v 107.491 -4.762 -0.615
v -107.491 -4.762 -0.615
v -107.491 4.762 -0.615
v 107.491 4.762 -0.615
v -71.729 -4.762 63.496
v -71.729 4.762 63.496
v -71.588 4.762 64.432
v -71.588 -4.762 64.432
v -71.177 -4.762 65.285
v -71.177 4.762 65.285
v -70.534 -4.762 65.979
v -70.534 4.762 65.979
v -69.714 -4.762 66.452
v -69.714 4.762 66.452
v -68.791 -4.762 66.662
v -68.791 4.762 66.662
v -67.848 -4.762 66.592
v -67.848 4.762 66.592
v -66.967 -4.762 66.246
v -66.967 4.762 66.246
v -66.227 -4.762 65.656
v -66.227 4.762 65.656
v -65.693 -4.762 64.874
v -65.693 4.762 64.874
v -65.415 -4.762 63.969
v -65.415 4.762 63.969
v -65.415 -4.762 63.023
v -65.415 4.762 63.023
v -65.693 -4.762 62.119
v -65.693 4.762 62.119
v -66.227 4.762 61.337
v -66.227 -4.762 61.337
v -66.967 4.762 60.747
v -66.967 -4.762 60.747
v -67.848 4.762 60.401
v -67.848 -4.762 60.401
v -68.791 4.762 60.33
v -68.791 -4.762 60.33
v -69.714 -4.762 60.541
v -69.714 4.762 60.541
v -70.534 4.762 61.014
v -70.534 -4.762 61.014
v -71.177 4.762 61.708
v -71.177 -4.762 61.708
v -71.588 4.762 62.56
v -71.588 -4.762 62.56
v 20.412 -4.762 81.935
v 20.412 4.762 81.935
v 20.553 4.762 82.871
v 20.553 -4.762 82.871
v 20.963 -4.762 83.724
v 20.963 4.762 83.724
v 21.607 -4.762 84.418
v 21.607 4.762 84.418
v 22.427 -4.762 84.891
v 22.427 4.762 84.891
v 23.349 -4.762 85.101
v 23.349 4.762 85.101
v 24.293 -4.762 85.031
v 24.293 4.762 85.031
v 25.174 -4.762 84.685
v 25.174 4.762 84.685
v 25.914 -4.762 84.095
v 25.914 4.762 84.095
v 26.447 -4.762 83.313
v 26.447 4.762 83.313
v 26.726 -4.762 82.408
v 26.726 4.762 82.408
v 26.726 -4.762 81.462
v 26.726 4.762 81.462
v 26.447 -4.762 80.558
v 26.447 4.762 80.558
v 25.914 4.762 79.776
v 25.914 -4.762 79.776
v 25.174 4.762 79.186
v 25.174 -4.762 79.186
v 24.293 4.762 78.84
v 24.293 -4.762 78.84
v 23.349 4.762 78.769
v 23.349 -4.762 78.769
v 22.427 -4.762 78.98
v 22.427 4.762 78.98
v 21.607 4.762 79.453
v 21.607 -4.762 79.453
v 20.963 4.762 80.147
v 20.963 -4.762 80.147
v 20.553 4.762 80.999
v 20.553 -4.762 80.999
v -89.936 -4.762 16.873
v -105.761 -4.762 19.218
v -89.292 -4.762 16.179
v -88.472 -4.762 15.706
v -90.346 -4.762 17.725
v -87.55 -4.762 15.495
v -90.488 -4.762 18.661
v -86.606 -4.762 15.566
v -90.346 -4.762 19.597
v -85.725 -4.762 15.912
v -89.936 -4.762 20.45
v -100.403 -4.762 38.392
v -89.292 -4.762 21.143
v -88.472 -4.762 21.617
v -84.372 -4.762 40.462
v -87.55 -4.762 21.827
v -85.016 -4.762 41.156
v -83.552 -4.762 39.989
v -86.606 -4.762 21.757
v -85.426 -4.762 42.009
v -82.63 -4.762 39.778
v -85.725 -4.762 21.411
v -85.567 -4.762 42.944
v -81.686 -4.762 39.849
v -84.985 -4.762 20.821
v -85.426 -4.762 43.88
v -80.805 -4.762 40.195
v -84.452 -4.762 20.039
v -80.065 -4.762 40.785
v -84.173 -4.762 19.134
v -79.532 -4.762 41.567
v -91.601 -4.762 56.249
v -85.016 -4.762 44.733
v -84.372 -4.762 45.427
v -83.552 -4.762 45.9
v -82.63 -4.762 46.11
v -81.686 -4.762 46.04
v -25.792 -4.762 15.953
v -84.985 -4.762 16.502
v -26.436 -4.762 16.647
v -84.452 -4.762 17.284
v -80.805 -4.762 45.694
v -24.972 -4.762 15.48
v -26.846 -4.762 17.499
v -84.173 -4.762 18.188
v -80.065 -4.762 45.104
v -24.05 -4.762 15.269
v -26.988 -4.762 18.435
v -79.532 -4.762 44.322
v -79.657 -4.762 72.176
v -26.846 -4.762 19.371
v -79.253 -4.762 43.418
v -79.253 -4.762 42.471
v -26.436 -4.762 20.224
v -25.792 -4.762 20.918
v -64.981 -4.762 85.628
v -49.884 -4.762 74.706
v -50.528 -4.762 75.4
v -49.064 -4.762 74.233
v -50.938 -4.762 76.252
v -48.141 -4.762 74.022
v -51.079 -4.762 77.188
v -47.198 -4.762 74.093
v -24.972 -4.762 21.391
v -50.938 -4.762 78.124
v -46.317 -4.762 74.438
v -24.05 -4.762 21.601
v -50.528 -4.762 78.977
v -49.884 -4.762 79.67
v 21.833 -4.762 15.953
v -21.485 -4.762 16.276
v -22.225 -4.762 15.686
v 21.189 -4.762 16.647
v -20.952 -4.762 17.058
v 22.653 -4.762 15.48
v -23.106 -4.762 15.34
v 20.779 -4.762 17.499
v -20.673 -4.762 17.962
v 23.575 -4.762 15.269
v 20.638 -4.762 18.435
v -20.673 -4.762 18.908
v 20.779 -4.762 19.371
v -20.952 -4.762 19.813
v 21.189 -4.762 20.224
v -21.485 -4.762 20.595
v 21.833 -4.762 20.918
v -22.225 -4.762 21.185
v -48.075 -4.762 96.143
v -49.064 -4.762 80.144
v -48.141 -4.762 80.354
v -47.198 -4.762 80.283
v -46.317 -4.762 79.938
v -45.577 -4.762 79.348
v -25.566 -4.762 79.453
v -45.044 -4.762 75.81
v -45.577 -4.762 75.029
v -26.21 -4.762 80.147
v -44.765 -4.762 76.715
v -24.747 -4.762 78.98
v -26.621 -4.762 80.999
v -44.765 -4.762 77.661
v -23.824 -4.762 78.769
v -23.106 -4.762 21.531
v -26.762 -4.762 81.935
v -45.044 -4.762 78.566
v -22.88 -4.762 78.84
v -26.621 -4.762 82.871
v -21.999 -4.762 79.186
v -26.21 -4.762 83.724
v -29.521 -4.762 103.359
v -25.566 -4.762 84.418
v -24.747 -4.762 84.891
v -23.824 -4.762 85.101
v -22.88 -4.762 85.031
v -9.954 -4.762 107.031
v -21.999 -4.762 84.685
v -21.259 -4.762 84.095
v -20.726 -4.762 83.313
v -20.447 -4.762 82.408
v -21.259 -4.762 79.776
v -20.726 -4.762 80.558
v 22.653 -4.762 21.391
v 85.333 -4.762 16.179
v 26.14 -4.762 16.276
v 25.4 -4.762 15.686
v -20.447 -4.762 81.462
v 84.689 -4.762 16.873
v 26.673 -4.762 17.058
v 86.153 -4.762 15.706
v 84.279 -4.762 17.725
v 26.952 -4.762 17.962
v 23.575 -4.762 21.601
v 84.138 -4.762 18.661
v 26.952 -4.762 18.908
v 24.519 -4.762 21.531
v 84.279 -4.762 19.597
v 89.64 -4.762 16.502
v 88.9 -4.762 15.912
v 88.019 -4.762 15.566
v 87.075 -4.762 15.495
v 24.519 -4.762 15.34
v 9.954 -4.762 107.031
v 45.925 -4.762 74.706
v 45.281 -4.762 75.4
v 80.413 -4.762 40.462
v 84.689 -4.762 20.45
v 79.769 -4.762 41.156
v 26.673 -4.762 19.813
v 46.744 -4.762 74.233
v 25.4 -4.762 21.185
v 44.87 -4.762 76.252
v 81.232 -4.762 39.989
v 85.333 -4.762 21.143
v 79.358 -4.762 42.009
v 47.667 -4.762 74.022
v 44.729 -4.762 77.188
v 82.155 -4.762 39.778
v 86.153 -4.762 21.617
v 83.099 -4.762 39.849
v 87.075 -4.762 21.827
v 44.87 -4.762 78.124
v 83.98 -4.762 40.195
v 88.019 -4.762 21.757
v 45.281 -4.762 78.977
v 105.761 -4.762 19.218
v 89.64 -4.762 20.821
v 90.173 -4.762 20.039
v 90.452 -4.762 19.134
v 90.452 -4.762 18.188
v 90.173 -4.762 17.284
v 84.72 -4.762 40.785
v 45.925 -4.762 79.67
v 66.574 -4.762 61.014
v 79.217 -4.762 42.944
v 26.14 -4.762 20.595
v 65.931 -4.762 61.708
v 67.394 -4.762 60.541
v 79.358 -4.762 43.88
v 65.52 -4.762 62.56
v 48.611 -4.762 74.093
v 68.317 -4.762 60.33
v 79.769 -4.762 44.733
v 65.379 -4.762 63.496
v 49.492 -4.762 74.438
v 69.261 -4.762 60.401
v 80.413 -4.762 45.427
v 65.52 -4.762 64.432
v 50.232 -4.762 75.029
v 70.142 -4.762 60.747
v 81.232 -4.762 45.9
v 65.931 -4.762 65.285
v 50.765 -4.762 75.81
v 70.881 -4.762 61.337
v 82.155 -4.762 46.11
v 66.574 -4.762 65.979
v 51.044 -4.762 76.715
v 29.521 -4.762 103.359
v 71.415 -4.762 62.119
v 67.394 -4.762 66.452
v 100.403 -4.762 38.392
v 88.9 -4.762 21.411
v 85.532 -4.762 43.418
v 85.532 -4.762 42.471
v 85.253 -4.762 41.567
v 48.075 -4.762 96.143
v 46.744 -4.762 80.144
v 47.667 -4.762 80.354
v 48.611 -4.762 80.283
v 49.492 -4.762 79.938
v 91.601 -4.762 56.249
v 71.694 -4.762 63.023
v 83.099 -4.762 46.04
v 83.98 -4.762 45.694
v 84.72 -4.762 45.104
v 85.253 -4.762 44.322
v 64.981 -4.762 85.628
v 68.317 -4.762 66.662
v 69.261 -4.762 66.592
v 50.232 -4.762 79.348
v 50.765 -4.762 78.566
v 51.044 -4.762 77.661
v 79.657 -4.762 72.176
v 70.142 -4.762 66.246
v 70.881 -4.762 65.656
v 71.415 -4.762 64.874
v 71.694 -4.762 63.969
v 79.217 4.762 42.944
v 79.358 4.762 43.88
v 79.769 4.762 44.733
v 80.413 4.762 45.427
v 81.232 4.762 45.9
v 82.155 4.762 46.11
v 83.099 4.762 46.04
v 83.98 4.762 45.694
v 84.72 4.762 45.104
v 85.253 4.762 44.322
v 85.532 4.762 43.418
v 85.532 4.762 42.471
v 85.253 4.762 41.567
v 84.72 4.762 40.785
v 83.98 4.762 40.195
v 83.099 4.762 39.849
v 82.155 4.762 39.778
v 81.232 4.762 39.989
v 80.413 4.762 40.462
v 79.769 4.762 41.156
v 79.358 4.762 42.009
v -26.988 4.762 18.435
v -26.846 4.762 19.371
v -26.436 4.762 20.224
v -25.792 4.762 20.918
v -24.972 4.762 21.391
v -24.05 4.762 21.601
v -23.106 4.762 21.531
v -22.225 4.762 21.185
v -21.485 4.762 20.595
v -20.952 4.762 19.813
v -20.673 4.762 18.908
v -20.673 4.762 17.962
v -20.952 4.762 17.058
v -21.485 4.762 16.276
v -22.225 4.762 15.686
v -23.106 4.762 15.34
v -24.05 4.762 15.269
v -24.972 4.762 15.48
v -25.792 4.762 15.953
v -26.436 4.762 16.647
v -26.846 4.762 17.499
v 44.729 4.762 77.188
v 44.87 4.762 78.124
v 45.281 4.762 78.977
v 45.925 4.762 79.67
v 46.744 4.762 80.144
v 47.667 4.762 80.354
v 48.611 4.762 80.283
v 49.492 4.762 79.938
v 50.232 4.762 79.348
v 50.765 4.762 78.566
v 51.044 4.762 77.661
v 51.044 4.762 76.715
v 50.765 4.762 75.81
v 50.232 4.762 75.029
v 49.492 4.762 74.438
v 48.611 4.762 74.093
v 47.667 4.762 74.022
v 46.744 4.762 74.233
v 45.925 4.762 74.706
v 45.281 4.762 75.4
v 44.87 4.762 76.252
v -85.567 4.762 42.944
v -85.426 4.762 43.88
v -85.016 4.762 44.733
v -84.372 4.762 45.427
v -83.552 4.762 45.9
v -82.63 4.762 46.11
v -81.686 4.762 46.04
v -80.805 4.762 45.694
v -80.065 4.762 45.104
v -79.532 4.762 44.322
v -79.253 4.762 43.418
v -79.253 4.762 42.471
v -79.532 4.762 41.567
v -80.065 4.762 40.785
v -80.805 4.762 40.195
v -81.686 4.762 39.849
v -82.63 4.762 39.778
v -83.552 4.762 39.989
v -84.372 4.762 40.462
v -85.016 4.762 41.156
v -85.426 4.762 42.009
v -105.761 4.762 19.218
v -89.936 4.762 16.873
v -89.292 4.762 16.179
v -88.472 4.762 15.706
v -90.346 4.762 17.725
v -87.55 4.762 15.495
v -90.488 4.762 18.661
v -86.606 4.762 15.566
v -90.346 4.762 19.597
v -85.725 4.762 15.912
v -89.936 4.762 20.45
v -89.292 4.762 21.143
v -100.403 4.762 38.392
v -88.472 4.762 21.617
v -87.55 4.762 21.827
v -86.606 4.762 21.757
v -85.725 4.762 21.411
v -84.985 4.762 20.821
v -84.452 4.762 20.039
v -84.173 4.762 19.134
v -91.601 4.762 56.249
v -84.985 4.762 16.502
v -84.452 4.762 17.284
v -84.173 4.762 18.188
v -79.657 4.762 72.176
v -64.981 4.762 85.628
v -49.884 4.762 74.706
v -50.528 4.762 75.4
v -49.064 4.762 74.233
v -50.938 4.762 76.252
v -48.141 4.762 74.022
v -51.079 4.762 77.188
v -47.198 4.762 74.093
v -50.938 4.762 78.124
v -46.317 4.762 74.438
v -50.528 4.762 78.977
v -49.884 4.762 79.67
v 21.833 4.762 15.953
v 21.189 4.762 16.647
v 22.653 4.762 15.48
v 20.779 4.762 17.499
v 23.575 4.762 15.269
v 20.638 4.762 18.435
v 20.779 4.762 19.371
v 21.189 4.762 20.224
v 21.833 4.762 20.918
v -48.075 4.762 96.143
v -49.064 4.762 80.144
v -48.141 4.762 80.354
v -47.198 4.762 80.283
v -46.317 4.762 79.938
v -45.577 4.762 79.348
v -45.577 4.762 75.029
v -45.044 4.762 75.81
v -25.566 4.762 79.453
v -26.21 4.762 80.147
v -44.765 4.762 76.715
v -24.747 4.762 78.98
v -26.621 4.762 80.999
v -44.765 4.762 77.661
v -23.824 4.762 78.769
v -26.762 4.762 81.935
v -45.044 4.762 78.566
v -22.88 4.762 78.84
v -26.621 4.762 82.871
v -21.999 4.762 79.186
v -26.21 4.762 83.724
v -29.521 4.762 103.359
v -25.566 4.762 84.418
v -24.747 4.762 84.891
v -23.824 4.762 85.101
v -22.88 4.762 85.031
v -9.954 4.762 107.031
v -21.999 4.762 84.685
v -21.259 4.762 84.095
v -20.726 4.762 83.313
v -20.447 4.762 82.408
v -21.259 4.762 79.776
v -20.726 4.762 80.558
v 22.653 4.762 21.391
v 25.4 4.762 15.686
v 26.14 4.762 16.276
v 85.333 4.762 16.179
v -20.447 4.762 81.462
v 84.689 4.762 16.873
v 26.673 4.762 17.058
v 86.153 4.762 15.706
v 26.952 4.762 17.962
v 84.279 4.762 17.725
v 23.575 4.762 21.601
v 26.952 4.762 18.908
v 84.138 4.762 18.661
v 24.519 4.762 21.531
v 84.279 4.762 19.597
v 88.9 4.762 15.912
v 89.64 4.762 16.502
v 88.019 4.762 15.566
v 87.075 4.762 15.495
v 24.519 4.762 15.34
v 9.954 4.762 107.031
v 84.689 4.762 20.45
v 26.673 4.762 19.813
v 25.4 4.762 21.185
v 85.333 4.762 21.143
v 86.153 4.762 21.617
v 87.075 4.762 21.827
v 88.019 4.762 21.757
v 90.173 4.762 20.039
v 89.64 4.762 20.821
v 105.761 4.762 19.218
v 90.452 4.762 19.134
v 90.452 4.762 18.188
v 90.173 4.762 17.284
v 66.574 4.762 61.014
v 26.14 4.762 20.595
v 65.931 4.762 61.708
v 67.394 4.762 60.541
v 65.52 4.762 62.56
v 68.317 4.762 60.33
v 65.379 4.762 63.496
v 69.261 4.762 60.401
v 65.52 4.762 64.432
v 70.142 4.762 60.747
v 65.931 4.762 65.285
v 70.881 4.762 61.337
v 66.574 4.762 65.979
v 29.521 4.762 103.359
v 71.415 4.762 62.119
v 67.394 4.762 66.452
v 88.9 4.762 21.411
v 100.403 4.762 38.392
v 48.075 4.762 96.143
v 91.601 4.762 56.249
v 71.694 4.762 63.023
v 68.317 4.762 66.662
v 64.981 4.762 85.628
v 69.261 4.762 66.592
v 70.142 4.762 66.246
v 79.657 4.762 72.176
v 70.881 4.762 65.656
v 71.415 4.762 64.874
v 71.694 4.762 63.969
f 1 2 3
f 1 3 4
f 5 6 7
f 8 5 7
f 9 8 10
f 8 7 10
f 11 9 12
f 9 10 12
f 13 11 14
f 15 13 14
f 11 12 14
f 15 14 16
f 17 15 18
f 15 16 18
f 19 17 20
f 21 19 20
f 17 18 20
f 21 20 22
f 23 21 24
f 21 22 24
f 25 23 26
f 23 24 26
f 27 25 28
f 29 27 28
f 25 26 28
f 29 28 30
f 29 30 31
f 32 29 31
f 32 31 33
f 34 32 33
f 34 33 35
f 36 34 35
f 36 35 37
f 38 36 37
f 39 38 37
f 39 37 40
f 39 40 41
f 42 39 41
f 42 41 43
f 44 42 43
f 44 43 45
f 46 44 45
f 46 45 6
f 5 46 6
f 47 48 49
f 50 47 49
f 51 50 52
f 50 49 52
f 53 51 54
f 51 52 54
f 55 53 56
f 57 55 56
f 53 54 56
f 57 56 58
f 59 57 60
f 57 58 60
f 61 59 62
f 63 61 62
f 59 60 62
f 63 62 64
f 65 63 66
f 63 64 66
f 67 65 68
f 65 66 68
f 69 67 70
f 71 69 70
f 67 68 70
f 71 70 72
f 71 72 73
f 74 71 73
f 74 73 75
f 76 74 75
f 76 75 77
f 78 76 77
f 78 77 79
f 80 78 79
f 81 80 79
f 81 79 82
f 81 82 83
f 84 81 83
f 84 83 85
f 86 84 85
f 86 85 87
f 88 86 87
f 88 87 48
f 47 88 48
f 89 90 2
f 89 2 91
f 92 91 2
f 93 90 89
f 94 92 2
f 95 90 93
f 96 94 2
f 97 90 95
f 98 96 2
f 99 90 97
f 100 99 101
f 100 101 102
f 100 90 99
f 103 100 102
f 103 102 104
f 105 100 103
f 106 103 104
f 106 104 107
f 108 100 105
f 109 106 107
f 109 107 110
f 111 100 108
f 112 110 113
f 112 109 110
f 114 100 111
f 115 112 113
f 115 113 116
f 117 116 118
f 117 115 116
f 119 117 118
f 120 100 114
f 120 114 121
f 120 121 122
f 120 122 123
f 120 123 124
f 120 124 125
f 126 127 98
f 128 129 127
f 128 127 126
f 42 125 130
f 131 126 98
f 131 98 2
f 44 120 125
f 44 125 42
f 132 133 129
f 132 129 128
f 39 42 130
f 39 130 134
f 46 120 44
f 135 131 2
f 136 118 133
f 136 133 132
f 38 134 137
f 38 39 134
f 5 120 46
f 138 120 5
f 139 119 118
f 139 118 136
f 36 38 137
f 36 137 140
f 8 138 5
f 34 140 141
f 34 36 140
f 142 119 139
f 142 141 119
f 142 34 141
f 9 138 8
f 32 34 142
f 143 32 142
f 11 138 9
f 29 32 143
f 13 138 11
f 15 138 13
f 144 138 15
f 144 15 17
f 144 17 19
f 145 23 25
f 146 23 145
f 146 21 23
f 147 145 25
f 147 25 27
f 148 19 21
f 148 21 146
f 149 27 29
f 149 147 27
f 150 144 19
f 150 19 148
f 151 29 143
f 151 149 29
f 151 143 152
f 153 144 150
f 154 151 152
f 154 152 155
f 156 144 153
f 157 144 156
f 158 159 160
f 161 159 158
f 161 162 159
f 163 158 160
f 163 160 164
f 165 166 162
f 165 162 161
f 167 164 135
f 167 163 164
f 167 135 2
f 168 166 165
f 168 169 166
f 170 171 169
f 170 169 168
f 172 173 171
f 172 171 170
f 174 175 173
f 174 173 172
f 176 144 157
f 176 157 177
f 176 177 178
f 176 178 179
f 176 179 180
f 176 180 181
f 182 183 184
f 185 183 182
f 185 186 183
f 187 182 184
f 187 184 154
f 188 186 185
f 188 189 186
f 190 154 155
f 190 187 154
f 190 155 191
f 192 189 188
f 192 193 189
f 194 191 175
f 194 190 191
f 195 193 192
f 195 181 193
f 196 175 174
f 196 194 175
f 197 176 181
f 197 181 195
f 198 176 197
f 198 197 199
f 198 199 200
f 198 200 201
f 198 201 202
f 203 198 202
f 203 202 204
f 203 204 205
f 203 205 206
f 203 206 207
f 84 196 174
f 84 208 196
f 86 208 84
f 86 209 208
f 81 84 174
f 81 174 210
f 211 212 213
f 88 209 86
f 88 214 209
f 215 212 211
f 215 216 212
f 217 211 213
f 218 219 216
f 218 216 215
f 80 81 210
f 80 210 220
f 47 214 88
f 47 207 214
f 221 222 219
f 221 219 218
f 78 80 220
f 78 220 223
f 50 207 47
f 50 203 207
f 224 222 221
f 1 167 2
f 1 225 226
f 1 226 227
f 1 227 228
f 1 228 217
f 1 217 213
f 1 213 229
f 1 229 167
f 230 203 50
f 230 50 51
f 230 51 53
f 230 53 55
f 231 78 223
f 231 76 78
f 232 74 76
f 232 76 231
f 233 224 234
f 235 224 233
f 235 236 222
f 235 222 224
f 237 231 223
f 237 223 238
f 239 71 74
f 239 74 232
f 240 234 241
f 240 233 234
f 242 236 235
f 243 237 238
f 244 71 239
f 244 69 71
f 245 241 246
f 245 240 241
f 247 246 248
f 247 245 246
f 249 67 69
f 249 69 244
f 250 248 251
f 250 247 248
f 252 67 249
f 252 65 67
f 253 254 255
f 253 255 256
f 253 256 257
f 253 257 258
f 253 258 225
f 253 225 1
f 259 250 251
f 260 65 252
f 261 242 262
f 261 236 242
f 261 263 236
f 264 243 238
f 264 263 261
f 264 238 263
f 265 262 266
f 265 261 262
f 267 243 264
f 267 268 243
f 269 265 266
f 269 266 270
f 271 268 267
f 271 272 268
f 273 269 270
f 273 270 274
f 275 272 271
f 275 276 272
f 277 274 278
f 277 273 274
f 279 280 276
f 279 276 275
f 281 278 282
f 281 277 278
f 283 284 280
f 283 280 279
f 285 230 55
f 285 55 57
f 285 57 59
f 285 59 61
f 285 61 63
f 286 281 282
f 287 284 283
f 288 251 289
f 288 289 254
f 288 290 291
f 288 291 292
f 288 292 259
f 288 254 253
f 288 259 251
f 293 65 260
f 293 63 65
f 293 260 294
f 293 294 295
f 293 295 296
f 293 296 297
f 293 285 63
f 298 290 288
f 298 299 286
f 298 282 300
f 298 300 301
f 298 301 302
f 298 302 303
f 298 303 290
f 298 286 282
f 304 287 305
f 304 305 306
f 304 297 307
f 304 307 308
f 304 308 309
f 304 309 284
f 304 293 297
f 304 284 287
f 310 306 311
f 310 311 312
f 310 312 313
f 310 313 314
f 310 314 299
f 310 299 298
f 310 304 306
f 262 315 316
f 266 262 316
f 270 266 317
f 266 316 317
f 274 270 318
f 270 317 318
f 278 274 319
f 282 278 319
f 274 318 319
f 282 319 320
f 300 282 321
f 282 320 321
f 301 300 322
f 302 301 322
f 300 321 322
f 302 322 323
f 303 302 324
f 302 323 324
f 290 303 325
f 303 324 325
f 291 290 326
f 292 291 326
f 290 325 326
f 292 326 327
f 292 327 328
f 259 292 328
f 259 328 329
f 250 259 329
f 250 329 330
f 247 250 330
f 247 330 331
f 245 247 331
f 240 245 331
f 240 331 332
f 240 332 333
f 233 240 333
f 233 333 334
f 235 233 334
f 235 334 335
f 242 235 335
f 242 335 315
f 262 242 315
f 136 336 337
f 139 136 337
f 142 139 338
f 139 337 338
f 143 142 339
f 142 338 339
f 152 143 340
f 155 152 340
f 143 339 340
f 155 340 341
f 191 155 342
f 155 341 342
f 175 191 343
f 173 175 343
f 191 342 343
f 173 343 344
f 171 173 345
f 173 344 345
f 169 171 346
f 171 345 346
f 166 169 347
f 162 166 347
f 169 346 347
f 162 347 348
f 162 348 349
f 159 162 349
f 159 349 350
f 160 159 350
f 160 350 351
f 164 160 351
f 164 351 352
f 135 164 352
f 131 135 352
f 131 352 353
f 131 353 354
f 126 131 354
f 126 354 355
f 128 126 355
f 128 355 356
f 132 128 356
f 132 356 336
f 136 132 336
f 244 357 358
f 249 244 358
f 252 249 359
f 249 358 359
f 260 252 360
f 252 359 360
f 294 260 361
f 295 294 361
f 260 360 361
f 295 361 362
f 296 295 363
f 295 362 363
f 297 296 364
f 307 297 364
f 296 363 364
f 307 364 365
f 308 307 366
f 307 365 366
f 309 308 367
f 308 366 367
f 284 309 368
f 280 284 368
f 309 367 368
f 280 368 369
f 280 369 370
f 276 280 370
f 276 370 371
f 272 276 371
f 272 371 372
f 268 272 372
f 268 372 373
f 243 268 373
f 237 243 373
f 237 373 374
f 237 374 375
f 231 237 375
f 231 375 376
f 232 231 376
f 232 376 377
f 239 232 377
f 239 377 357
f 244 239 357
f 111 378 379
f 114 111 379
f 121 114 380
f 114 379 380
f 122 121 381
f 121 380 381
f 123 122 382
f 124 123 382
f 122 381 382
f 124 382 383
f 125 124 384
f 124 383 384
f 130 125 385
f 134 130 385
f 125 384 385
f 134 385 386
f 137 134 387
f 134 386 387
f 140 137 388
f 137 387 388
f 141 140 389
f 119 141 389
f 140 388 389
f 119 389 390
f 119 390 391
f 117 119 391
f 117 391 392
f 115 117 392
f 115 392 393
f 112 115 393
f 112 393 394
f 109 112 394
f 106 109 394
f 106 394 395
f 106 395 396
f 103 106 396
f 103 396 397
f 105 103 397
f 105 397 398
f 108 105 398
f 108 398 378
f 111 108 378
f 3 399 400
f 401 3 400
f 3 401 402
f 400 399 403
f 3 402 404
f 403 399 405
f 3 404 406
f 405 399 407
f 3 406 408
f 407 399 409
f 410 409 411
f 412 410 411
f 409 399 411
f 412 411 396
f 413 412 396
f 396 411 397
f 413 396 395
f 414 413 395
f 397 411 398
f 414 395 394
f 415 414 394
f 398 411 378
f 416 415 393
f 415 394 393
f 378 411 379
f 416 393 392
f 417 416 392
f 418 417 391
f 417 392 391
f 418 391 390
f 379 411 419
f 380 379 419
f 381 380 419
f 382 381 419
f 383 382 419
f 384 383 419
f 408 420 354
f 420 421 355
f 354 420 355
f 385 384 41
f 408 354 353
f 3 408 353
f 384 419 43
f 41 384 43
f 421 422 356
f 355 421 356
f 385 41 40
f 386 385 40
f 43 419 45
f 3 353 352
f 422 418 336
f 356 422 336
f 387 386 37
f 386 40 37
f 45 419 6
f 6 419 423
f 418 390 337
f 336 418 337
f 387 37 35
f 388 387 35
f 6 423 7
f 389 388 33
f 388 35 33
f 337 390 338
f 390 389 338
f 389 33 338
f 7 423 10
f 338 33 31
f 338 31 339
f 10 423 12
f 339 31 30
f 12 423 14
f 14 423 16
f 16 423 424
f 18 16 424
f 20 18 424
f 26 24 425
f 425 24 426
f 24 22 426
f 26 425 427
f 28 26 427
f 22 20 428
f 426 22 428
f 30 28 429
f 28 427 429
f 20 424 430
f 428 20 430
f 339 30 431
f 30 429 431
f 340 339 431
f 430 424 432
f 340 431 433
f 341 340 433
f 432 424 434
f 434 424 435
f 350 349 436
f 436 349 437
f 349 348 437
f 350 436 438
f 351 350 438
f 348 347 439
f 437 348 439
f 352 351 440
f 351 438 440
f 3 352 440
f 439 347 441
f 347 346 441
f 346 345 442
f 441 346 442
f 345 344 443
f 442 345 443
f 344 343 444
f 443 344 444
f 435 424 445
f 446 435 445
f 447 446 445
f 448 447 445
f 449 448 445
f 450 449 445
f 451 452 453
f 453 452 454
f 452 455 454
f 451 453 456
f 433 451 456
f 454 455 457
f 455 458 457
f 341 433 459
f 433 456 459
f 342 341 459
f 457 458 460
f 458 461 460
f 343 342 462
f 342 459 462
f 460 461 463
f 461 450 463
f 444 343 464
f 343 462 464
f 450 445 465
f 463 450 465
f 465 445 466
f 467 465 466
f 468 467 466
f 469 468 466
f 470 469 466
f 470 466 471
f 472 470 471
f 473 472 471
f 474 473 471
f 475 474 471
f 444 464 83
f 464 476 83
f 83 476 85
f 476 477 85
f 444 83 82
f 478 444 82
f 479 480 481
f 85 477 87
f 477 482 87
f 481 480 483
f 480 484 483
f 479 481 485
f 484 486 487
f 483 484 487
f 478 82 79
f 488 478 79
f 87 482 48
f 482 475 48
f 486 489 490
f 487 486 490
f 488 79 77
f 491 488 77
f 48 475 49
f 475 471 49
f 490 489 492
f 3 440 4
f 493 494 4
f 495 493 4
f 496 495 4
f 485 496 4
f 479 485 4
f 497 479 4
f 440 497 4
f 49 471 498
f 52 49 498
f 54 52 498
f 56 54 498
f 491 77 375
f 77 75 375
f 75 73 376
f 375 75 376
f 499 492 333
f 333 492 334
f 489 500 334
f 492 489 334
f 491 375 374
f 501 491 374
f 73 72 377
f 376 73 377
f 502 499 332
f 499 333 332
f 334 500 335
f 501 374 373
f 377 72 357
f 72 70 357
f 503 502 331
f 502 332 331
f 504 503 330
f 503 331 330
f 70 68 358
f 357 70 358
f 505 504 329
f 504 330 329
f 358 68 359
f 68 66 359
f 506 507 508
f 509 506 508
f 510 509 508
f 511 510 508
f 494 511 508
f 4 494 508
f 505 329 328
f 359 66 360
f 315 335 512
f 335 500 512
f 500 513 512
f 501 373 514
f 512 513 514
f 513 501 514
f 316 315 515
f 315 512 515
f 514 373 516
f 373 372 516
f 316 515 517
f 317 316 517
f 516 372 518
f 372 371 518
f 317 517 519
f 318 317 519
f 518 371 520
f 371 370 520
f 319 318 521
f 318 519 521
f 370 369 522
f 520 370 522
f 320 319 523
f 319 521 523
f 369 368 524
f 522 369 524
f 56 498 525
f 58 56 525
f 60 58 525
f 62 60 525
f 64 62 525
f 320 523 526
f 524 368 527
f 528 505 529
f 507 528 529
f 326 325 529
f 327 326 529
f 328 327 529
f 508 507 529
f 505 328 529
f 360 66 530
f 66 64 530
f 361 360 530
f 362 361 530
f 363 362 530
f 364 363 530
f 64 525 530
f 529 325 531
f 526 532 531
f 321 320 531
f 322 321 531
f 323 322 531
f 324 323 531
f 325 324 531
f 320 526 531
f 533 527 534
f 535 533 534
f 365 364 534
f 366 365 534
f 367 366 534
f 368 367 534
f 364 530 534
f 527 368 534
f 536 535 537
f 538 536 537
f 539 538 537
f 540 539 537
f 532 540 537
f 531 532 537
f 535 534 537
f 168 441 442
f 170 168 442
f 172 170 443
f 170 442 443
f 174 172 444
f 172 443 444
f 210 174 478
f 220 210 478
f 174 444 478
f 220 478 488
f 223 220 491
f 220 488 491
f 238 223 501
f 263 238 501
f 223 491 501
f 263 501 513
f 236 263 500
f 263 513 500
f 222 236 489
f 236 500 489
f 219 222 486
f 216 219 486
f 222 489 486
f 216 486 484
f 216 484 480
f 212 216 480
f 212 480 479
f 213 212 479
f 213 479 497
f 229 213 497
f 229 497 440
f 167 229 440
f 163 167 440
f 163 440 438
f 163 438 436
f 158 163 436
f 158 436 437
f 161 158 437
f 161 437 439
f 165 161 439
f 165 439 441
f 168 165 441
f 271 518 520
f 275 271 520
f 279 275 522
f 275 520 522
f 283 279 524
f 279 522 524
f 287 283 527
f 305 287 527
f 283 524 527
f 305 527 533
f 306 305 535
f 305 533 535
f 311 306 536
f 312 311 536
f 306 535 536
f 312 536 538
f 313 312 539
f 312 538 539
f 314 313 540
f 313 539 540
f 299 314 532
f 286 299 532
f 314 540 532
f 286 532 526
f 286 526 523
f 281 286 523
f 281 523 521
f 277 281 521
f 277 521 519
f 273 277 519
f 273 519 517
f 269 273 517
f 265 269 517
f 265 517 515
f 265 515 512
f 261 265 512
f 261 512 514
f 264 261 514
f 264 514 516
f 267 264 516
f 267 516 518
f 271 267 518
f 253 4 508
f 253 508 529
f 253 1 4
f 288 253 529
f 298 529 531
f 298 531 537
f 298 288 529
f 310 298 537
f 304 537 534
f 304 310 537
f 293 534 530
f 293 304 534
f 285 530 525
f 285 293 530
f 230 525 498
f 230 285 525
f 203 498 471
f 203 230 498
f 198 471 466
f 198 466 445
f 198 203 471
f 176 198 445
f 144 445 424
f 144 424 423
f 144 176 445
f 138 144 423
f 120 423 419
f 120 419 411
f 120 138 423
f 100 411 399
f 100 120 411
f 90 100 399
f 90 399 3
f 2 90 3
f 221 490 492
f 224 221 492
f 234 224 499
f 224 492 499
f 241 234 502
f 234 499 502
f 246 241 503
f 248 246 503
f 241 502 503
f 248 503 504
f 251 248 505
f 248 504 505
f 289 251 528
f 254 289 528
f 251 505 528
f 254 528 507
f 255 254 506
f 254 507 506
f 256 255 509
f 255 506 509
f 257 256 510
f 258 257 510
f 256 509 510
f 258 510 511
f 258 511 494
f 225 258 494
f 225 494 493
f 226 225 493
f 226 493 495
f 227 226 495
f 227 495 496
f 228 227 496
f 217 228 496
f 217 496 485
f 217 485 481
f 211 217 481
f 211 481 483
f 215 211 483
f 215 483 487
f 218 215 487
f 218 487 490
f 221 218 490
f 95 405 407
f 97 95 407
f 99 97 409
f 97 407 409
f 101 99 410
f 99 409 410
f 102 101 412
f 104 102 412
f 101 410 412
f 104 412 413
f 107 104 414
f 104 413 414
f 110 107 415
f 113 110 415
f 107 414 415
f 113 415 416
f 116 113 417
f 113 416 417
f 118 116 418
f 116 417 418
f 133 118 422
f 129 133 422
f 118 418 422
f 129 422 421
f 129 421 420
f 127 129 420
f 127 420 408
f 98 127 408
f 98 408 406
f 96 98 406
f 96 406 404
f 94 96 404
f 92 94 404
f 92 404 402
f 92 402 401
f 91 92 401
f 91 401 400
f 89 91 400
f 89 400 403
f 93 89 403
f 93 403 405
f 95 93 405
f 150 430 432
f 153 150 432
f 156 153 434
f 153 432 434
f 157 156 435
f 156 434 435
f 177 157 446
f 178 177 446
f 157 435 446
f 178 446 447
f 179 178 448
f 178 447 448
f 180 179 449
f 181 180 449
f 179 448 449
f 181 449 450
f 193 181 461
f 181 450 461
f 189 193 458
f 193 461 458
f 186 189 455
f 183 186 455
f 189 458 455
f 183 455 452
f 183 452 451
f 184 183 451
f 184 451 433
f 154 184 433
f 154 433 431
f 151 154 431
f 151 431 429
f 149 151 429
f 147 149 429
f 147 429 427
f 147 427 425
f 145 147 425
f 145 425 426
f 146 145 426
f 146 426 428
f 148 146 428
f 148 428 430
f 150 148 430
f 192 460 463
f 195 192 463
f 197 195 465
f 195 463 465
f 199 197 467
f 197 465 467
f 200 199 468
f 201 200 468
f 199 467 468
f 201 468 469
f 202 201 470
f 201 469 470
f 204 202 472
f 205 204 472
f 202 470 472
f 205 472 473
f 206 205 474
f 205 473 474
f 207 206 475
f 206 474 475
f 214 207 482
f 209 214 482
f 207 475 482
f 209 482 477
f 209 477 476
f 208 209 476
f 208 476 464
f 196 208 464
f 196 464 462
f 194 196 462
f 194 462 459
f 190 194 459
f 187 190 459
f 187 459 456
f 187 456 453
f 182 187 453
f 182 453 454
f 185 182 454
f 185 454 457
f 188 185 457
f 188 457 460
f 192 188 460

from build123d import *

# Parameters (mm, degrees)
F1_DEPTH = 4.7625
F3_D     = 6.35


with BuildPart() as f1:
    # F0 (on Front) → F1 (new body, symmetric)
    with BuildSketch(Plane.XZ):
        with BuildLine():
            ThreePointArc((107.490789, -0.614724), (0, 107.492547), (-107.490789, -0.614724))
            Line((-107.490789, -0.614724), (107.490789, -0.614724))
        make_face()
    extrude(amount=F1_DEPTH, both=True)

    # F3 (through all)
    with Locations(Plane.XZ.offset(4.7625)):
        with Locations((23.8125, 18.435276), (87.3125, 18.661174), (47.904196, 77.188074), (23.586602, 81.935276), (68.554047, 63.49629), (82.392403, 42.944376), (-23.8125, 18.435276), (-23.586602, 81.935276), (-47.904196, 77.188074), (-68.554047, 63.49629), (-82.392403, 42.944376), (-87.3125, 18.661174)):
            Hole(F3_D / 2)


solid = f1.part
